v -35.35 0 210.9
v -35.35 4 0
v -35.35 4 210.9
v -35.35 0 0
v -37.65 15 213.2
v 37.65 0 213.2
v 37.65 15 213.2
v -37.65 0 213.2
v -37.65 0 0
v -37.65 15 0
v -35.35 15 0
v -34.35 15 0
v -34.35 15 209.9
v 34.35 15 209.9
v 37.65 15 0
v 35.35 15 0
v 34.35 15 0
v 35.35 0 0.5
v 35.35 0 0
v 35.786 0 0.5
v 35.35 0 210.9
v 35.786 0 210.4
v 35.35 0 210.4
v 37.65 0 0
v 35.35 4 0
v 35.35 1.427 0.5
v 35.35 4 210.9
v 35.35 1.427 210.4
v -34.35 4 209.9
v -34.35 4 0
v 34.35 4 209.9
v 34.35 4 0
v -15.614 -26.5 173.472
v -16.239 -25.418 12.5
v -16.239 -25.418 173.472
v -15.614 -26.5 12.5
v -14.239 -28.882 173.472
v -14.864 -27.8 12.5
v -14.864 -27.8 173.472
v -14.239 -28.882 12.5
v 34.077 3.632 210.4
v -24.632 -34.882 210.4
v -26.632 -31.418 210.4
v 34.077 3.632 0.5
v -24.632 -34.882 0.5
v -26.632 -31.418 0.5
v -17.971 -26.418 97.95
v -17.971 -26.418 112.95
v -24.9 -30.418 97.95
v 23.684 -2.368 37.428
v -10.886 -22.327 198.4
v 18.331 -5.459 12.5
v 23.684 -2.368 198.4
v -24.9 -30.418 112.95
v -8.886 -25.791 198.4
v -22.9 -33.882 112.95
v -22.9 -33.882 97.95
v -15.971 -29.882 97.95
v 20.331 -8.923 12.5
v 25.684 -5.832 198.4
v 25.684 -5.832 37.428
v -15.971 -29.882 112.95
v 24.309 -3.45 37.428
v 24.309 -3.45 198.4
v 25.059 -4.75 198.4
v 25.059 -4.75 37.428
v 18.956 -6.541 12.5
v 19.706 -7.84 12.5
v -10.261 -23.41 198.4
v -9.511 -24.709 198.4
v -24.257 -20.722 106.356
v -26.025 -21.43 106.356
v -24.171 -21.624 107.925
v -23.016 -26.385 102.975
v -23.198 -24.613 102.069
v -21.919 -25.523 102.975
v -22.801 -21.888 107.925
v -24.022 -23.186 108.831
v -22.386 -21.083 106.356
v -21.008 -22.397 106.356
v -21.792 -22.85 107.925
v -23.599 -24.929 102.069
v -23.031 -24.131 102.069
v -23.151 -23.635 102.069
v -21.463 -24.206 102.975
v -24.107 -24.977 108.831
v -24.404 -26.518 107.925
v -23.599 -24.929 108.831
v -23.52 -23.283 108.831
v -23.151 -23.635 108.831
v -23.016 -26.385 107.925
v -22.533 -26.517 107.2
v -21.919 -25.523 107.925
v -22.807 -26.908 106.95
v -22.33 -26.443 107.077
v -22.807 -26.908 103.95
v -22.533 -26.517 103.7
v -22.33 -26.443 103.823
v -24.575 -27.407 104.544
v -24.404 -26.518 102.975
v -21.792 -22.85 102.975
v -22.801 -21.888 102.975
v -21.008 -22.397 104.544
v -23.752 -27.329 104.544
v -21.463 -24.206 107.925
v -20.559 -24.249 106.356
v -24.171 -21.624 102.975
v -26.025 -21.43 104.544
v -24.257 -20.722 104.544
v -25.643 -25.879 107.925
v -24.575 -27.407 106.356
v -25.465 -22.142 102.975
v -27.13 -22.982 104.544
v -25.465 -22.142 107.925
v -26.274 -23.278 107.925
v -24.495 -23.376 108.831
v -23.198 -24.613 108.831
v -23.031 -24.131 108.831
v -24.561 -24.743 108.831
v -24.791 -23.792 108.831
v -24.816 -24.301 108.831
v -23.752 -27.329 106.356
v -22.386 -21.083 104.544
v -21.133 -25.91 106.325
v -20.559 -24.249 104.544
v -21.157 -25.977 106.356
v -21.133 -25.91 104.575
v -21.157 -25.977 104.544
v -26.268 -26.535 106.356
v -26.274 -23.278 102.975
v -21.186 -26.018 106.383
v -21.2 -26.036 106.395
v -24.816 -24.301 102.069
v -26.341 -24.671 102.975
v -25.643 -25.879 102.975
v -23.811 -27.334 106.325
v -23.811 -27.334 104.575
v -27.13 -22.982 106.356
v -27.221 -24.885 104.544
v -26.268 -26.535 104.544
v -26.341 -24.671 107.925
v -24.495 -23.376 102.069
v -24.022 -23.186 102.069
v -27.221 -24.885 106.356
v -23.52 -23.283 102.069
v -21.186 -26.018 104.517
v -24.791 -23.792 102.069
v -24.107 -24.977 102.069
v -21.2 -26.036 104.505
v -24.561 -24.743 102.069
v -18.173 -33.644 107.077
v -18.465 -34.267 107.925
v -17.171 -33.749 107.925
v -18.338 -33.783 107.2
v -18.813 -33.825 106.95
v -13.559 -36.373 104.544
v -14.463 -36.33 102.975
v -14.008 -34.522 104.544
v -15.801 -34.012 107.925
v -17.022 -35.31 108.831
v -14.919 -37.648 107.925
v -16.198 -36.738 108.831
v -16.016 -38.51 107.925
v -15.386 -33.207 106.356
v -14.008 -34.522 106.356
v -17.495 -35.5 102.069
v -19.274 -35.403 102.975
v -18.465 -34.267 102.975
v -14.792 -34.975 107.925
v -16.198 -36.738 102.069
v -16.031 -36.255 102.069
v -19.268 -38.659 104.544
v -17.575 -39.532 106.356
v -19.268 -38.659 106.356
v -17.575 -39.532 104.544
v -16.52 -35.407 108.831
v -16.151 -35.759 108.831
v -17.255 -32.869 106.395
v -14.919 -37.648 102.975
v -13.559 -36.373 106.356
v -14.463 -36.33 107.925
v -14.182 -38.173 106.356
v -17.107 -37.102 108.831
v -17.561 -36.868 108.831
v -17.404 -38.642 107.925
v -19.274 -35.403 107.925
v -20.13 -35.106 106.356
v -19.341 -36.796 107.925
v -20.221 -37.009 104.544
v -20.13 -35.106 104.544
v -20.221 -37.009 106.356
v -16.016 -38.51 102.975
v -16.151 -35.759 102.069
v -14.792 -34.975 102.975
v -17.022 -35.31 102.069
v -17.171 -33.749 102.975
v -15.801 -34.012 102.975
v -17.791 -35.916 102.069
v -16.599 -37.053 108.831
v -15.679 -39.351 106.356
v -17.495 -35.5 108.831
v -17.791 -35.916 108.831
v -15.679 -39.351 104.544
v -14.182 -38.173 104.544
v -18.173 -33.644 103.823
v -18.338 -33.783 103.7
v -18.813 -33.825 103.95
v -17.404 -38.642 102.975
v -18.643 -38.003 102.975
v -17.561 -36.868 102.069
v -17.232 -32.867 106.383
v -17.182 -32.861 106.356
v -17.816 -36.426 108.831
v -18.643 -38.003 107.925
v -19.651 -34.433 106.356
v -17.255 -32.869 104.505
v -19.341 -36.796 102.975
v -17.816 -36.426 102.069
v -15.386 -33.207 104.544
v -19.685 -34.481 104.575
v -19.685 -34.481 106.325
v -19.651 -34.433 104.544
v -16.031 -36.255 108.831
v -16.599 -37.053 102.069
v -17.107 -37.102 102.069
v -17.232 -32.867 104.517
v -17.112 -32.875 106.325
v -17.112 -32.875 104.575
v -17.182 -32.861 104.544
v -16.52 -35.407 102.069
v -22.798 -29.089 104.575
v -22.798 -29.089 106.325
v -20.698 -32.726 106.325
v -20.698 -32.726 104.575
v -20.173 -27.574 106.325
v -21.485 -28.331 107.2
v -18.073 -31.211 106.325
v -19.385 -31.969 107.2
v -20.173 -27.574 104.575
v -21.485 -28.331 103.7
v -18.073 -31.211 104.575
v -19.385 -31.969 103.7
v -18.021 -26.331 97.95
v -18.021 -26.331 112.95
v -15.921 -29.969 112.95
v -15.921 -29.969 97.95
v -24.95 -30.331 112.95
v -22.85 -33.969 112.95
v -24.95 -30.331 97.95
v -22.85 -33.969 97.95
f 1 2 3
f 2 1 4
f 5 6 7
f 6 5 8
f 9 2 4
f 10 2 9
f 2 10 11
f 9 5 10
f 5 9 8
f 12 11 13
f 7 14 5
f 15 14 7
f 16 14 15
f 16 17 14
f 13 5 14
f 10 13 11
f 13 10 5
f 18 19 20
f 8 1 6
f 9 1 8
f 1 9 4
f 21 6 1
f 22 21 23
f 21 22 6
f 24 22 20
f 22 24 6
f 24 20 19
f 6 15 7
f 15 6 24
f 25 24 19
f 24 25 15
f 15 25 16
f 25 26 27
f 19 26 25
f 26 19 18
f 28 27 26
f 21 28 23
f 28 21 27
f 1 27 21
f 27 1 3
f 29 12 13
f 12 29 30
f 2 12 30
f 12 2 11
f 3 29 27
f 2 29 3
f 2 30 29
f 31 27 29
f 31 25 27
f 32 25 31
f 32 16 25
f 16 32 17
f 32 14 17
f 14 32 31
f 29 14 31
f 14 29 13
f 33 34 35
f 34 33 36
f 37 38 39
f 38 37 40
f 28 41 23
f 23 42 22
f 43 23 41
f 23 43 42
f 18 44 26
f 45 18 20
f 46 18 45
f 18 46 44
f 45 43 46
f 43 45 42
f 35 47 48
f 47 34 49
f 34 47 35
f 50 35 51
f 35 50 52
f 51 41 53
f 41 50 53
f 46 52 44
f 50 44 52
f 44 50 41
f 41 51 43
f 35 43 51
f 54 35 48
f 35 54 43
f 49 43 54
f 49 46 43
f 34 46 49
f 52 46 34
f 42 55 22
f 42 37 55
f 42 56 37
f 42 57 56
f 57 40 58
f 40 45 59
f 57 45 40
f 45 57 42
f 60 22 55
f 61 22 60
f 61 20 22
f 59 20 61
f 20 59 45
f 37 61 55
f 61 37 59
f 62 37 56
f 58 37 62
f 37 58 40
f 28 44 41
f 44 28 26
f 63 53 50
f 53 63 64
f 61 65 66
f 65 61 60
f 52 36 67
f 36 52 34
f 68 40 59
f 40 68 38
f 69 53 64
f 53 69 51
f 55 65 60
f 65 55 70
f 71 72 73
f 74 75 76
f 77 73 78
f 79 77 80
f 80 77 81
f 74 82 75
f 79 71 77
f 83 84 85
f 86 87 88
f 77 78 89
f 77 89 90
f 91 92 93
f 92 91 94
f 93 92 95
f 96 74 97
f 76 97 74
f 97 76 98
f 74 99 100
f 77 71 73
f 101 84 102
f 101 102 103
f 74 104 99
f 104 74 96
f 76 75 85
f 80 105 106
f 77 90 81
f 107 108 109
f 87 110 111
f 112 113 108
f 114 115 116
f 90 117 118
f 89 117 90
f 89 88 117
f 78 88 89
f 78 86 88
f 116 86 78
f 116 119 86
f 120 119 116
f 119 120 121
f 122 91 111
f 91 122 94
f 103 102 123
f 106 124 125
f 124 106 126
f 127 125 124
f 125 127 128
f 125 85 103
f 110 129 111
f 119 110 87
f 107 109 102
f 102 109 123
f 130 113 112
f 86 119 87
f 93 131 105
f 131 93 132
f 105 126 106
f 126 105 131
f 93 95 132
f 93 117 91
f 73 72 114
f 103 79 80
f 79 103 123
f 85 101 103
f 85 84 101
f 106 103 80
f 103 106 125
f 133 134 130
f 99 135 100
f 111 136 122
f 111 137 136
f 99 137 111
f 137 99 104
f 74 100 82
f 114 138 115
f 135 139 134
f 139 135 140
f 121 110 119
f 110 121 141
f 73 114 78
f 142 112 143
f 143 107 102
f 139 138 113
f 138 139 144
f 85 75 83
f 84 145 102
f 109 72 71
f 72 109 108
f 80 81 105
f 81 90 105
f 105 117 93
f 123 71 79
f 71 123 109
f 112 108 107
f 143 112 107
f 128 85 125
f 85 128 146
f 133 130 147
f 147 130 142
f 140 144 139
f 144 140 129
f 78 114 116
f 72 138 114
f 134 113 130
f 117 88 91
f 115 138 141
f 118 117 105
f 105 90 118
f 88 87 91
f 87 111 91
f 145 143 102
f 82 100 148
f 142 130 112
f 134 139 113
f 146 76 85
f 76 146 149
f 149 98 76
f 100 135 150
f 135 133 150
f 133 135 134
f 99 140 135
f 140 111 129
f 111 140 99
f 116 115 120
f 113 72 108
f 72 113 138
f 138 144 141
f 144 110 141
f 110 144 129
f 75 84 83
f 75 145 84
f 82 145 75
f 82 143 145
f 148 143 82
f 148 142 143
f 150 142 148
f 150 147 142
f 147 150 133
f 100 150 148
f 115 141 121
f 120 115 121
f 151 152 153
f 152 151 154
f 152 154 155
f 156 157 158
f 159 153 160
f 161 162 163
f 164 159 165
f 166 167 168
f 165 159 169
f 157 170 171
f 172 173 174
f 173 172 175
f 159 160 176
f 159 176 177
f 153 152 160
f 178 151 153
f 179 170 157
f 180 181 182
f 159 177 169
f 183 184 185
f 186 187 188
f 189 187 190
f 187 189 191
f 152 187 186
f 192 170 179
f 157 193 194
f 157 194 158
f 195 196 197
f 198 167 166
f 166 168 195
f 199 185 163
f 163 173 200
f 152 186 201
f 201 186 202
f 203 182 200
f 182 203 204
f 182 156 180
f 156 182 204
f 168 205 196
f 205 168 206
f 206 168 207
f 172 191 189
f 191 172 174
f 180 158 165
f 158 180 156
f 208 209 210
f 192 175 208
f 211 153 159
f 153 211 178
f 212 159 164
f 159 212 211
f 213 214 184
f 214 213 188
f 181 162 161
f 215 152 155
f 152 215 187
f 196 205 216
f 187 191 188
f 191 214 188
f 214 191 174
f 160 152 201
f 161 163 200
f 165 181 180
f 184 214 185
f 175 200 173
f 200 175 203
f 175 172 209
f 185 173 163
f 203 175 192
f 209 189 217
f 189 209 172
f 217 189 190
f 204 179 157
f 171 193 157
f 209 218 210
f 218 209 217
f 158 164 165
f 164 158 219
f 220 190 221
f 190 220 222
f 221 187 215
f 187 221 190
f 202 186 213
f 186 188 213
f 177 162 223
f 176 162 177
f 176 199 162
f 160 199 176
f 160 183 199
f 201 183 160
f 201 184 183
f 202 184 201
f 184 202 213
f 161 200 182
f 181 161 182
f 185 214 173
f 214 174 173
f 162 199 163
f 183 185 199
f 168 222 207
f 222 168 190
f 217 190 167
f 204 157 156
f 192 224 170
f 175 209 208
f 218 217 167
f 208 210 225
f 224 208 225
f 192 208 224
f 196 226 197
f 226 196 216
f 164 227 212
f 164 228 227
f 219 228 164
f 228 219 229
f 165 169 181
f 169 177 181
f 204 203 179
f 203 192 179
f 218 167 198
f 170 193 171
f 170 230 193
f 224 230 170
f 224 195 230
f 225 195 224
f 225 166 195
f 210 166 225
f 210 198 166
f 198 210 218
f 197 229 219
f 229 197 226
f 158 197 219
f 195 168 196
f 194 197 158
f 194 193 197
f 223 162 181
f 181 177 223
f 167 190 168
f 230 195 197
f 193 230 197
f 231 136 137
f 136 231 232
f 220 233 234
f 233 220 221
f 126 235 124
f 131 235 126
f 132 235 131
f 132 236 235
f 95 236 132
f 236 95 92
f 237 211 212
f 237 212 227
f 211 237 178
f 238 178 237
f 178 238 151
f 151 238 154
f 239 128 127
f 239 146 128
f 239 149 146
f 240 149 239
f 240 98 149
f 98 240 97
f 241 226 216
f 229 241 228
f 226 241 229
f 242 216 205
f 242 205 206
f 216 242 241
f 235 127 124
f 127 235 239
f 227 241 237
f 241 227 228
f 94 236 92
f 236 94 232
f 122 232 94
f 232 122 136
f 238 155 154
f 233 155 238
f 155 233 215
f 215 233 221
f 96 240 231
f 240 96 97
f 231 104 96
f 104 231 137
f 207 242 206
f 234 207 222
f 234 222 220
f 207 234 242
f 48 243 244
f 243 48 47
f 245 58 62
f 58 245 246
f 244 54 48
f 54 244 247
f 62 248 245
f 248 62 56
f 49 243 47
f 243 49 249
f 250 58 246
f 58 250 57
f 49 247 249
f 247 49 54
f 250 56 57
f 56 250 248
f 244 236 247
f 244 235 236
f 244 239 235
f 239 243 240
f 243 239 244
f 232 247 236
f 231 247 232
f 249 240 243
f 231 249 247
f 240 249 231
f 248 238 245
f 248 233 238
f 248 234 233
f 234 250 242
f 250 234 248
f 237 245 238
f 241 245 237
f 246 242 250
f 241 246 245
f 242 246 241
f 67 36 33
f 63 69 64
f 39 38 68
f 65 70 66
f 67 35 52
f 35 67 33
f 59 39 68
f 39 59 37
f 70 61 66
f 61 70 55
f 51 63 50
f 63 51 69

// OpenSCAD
basic_door_w = 75.3;
basic_door_h = 213.2;


module basicdoor(wall_thickness=15, right_handed = false, open_angle = 30, width=basic_door_w, height=basic_door_h) 
{
    profile_width = 12;
    door_thickness = 4.0;
    frame_profile_width = 2.3;
    frame_profile_depth = wall_thickness;
    seal_profile_width = 1.0;
    
    translate([0,wall_thickness/2,height/2])
    {
    
    /* Outer frame fixed to convrete wall. */
    color([0.3,0.0,0.1])
    basicdoorframe(false, width, height, frame_profile_width, frame_profile_depth);

    color([0.4,0.2,0.2])
    translate([0, door_thickness/2,-frame_profile_width/2])
    basicdoorframe(false, width - 2 * frame_profile_width,
        height - frame_profile_width, 
        seal_profile_width, frame_profile_depth - door_thickness);
    
    /* Calculate door size. */
    open_w = width - 2 * frame_profile_width - 0.6;
    open_h = height - frame_profile_width - 1.0;

    ow = open_w/2 + 0.2;
    translate([right_handed?-ow:ow, 
        -(frame_profile_depth-door_thickness)/2, -frame_profile_width/2])
    rotate([0, 0, right_handed?-open_angle:open_angle])
    translate([right_handed?ow:-ow, 0, 0])
     union() {
        /* Playwood */
        color([0.4,0.0,0.1])
        cube([open_w, 1.5, open_h], center=true);
        
        /* Door strengtehing. */
        color([0.5,0.2,0.2])
        basicdoorframe(true, open_w, open_h, profile_width, door_thickness);
        
         /* Diagonal strengthening */
        dx = open_w - 2*profile_width;
        dy = open_h - 2*profile_width;
        l = sqrt(dx*dx+dy*dy);
        rotate([0,-atan2(dx,dy), 0])
        color([0.5,0.2,0.2])
        cube([profile_width, door_thickness, l], center=true);
         
         /* Door knob */
         translate([right_handed ? open_w/2 - 6.0 
            : -open_w/2 + 6.0, 0, 0])
         color([218/255,172/255,96/255])
         doorknob(door_thickness);
    }
    }
}

module basicdoorhole(wall_thickness=15, width=basic_door_w, height=basic_door_h) 
{
    color("White")
    translate([0, wall_thickness/2, height/2])
    cube([width, wall_thickness+4, height], center=true);
}

module basicdoorframe(draw_bottom=true,width=70, height=110, profile_width = 5, door_thickness = 8) 
{
    translate([-(width - profile_width)/2, 0, 0]) 
    cube([profile_width,door_thickness, height], center=true);
    
    translate([(width - profile_width)/2, 0, 0]) 
    cube([profile_width,door_thickness, height], center=true);

    if (draw_bottom) {
        translate([0, 0, -(height - profile_width)/2]) 
        cube([width, door_thickness, profile_width], center=true);
    }
    
    translate([0, 0, (height - profile_width)/2]) 
    cube([width, door_thickness, profile_width], center=true);
}    

module doorknob(door_thickness = 8)
{
    doorknob_length = 7;
    doorknob_r = 3.5;
    
    translate([0, doorknob_length, 0]) 
    sphere(r=doorknob_r);
    translate([0, -doorknob_length, 0]) 
    sphere(r=doorknob_r);
 
    rotate([90, 90, 0])
    cylinder(h = doorknob_length*2, r = 0.5 * doorknob_r, center=true);
   
    cube([8, door_thickness+0.2, 15],center=true); 
}

// For testing
basicdoor();
